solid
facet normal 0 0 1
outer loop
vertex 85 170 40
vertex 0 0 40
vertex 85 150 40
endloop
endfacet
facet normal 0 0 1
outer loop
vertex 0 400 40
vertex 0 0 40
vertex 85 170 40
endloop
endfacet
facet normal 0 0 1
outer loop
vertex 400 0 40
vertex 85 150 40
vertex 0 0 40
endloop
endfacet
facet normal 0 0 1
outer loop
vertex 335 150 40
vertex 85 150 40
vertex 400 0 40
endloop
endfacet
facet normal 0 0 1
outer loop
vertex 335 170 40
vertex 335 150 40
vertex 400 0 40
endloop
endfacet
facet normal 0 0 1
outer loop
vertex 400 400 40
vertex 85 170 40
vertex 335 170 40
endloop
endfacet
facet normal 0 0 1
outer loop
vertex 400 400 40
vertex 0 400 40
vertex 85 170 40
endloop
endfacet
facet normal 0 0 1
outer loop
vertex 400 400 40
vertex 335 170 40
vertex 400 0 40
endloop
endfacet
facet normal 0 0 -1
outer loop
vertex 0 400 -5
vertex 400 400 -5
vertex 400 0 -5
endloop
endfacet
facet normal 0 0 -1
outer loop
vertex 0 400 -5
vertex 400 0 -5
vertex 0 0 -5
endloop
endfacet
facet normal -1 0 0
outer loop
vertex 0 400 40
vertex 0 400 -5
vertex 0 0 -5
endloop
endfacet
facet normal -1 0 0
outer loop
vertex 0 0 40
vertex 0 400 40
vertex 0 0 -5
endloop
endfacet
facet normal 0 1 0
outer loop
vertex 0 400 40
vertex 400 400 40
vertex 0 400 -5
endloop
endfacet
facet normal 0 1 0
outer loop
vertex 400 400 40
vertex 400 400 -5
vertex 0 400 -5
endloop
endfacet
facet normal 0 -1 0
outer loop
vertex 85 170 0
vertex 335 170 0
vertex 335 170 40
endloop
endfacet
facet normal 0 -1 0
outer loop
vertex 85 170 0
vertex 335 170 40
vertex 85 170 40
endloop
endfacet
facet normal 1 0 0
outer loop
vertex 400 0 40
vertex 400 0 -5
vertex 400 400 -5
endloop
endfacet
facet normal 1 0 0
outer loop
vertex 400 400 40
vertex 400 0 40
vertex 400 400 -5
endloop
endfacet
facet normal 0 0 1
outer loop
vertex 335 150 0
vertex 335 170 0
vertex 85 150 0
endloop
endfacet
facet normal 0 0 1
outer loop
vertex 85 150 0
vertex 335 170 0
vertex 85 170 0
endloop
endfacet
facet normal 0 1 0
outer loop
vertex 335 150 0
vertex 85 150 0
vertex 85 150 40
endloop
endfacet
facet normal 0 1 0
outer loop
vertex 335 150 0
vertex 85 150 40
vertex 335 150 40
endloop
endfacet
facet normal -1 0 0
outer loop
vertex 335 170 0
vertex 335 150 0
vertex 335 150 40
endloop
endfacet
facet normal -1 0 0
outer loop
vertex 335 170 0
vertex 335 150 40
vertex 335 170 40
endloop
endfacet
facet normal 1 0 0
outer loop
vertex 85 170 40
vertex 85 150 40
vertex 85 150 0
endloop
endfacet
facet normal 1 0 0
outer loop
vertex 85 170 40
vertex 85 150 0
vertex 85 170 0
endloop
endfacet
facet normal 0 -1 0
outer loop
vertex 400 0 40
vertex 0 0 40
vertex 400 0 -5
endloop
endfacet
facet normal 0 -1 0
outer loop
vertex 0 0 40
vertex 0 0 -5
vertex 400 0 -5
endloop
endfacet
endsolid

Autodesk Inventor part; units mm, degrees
ref_plane "YZ Plane" through (0, 0, 0) normal (1, 0, 0) x (0, 1, 0)
ref_plane "XZ Plane" through (0, 0, 0) normal (0, 1, 0) x (-1, 0, 0)
ref_plane "XY Plane" through (0, 0, 0) normal (0, 0, 1) x (1, 0, 0)
sketch "Sketch1" plane through (0, 0, 0) normal (0, 0, 1) x (1, 0, 0)
  line L0 (0, 0) -> (400, 0)
  line L1 (400, 0) -> (400, 400)
  line L2 (400, 400) -> (0, 400)
  line L3 (0, 400) -> (0, 0)
  line L4 (135, 150) -> (335, 150)
  line L5 (335, 150) -> (335, 170)
  line L6 (335, 170) -> (135, 170)
  line L7 (135, 170) -> (135, 150)
  dimension "d0" = 400
  dimension "d1" = 400
  dimension "d2" = 200
  dimension "d3" = 20
extrude "Extrusion1" add sketch "Sketch1" along normal blind 40
sketch "Sketch2" plane through (0, 0, 0) normal (0, 0, -1) x (-1, 0, 0)
  line L0 (-400, 0) -> (-400, 400) projected
  line L1 (0, 400) -> (-400, 400)
  line L2 (-400, 400) -> (-400, 0)
  line L3 (-400, 0) -> (0, 0)
  line L4 (0, 0) -> (0, 400)
extrude "Extrusion2" add sketch "Sketch2" along normal blind 5
sketch "Sketch3" plane through (0, 0, 40) normal (0, 0, 1) x (1, 0, 0)
  line L0 (335, 150) -> (135, 150) projected
  line L1 (135, 150) -> (85, 150)
  line L2 (85, 150) -> (85, 170)
  line L3 (85, 170) -> (135, 170)
  line L4 (135, 170) -> (135, 150)
  point P0 (0, 0)
  dimension "d8" = 50
  dimension "d9" = 20
extrude "Extrusion3" cut sketch "Sketch3" against normal blind 40
properties part number "basebottomds"
